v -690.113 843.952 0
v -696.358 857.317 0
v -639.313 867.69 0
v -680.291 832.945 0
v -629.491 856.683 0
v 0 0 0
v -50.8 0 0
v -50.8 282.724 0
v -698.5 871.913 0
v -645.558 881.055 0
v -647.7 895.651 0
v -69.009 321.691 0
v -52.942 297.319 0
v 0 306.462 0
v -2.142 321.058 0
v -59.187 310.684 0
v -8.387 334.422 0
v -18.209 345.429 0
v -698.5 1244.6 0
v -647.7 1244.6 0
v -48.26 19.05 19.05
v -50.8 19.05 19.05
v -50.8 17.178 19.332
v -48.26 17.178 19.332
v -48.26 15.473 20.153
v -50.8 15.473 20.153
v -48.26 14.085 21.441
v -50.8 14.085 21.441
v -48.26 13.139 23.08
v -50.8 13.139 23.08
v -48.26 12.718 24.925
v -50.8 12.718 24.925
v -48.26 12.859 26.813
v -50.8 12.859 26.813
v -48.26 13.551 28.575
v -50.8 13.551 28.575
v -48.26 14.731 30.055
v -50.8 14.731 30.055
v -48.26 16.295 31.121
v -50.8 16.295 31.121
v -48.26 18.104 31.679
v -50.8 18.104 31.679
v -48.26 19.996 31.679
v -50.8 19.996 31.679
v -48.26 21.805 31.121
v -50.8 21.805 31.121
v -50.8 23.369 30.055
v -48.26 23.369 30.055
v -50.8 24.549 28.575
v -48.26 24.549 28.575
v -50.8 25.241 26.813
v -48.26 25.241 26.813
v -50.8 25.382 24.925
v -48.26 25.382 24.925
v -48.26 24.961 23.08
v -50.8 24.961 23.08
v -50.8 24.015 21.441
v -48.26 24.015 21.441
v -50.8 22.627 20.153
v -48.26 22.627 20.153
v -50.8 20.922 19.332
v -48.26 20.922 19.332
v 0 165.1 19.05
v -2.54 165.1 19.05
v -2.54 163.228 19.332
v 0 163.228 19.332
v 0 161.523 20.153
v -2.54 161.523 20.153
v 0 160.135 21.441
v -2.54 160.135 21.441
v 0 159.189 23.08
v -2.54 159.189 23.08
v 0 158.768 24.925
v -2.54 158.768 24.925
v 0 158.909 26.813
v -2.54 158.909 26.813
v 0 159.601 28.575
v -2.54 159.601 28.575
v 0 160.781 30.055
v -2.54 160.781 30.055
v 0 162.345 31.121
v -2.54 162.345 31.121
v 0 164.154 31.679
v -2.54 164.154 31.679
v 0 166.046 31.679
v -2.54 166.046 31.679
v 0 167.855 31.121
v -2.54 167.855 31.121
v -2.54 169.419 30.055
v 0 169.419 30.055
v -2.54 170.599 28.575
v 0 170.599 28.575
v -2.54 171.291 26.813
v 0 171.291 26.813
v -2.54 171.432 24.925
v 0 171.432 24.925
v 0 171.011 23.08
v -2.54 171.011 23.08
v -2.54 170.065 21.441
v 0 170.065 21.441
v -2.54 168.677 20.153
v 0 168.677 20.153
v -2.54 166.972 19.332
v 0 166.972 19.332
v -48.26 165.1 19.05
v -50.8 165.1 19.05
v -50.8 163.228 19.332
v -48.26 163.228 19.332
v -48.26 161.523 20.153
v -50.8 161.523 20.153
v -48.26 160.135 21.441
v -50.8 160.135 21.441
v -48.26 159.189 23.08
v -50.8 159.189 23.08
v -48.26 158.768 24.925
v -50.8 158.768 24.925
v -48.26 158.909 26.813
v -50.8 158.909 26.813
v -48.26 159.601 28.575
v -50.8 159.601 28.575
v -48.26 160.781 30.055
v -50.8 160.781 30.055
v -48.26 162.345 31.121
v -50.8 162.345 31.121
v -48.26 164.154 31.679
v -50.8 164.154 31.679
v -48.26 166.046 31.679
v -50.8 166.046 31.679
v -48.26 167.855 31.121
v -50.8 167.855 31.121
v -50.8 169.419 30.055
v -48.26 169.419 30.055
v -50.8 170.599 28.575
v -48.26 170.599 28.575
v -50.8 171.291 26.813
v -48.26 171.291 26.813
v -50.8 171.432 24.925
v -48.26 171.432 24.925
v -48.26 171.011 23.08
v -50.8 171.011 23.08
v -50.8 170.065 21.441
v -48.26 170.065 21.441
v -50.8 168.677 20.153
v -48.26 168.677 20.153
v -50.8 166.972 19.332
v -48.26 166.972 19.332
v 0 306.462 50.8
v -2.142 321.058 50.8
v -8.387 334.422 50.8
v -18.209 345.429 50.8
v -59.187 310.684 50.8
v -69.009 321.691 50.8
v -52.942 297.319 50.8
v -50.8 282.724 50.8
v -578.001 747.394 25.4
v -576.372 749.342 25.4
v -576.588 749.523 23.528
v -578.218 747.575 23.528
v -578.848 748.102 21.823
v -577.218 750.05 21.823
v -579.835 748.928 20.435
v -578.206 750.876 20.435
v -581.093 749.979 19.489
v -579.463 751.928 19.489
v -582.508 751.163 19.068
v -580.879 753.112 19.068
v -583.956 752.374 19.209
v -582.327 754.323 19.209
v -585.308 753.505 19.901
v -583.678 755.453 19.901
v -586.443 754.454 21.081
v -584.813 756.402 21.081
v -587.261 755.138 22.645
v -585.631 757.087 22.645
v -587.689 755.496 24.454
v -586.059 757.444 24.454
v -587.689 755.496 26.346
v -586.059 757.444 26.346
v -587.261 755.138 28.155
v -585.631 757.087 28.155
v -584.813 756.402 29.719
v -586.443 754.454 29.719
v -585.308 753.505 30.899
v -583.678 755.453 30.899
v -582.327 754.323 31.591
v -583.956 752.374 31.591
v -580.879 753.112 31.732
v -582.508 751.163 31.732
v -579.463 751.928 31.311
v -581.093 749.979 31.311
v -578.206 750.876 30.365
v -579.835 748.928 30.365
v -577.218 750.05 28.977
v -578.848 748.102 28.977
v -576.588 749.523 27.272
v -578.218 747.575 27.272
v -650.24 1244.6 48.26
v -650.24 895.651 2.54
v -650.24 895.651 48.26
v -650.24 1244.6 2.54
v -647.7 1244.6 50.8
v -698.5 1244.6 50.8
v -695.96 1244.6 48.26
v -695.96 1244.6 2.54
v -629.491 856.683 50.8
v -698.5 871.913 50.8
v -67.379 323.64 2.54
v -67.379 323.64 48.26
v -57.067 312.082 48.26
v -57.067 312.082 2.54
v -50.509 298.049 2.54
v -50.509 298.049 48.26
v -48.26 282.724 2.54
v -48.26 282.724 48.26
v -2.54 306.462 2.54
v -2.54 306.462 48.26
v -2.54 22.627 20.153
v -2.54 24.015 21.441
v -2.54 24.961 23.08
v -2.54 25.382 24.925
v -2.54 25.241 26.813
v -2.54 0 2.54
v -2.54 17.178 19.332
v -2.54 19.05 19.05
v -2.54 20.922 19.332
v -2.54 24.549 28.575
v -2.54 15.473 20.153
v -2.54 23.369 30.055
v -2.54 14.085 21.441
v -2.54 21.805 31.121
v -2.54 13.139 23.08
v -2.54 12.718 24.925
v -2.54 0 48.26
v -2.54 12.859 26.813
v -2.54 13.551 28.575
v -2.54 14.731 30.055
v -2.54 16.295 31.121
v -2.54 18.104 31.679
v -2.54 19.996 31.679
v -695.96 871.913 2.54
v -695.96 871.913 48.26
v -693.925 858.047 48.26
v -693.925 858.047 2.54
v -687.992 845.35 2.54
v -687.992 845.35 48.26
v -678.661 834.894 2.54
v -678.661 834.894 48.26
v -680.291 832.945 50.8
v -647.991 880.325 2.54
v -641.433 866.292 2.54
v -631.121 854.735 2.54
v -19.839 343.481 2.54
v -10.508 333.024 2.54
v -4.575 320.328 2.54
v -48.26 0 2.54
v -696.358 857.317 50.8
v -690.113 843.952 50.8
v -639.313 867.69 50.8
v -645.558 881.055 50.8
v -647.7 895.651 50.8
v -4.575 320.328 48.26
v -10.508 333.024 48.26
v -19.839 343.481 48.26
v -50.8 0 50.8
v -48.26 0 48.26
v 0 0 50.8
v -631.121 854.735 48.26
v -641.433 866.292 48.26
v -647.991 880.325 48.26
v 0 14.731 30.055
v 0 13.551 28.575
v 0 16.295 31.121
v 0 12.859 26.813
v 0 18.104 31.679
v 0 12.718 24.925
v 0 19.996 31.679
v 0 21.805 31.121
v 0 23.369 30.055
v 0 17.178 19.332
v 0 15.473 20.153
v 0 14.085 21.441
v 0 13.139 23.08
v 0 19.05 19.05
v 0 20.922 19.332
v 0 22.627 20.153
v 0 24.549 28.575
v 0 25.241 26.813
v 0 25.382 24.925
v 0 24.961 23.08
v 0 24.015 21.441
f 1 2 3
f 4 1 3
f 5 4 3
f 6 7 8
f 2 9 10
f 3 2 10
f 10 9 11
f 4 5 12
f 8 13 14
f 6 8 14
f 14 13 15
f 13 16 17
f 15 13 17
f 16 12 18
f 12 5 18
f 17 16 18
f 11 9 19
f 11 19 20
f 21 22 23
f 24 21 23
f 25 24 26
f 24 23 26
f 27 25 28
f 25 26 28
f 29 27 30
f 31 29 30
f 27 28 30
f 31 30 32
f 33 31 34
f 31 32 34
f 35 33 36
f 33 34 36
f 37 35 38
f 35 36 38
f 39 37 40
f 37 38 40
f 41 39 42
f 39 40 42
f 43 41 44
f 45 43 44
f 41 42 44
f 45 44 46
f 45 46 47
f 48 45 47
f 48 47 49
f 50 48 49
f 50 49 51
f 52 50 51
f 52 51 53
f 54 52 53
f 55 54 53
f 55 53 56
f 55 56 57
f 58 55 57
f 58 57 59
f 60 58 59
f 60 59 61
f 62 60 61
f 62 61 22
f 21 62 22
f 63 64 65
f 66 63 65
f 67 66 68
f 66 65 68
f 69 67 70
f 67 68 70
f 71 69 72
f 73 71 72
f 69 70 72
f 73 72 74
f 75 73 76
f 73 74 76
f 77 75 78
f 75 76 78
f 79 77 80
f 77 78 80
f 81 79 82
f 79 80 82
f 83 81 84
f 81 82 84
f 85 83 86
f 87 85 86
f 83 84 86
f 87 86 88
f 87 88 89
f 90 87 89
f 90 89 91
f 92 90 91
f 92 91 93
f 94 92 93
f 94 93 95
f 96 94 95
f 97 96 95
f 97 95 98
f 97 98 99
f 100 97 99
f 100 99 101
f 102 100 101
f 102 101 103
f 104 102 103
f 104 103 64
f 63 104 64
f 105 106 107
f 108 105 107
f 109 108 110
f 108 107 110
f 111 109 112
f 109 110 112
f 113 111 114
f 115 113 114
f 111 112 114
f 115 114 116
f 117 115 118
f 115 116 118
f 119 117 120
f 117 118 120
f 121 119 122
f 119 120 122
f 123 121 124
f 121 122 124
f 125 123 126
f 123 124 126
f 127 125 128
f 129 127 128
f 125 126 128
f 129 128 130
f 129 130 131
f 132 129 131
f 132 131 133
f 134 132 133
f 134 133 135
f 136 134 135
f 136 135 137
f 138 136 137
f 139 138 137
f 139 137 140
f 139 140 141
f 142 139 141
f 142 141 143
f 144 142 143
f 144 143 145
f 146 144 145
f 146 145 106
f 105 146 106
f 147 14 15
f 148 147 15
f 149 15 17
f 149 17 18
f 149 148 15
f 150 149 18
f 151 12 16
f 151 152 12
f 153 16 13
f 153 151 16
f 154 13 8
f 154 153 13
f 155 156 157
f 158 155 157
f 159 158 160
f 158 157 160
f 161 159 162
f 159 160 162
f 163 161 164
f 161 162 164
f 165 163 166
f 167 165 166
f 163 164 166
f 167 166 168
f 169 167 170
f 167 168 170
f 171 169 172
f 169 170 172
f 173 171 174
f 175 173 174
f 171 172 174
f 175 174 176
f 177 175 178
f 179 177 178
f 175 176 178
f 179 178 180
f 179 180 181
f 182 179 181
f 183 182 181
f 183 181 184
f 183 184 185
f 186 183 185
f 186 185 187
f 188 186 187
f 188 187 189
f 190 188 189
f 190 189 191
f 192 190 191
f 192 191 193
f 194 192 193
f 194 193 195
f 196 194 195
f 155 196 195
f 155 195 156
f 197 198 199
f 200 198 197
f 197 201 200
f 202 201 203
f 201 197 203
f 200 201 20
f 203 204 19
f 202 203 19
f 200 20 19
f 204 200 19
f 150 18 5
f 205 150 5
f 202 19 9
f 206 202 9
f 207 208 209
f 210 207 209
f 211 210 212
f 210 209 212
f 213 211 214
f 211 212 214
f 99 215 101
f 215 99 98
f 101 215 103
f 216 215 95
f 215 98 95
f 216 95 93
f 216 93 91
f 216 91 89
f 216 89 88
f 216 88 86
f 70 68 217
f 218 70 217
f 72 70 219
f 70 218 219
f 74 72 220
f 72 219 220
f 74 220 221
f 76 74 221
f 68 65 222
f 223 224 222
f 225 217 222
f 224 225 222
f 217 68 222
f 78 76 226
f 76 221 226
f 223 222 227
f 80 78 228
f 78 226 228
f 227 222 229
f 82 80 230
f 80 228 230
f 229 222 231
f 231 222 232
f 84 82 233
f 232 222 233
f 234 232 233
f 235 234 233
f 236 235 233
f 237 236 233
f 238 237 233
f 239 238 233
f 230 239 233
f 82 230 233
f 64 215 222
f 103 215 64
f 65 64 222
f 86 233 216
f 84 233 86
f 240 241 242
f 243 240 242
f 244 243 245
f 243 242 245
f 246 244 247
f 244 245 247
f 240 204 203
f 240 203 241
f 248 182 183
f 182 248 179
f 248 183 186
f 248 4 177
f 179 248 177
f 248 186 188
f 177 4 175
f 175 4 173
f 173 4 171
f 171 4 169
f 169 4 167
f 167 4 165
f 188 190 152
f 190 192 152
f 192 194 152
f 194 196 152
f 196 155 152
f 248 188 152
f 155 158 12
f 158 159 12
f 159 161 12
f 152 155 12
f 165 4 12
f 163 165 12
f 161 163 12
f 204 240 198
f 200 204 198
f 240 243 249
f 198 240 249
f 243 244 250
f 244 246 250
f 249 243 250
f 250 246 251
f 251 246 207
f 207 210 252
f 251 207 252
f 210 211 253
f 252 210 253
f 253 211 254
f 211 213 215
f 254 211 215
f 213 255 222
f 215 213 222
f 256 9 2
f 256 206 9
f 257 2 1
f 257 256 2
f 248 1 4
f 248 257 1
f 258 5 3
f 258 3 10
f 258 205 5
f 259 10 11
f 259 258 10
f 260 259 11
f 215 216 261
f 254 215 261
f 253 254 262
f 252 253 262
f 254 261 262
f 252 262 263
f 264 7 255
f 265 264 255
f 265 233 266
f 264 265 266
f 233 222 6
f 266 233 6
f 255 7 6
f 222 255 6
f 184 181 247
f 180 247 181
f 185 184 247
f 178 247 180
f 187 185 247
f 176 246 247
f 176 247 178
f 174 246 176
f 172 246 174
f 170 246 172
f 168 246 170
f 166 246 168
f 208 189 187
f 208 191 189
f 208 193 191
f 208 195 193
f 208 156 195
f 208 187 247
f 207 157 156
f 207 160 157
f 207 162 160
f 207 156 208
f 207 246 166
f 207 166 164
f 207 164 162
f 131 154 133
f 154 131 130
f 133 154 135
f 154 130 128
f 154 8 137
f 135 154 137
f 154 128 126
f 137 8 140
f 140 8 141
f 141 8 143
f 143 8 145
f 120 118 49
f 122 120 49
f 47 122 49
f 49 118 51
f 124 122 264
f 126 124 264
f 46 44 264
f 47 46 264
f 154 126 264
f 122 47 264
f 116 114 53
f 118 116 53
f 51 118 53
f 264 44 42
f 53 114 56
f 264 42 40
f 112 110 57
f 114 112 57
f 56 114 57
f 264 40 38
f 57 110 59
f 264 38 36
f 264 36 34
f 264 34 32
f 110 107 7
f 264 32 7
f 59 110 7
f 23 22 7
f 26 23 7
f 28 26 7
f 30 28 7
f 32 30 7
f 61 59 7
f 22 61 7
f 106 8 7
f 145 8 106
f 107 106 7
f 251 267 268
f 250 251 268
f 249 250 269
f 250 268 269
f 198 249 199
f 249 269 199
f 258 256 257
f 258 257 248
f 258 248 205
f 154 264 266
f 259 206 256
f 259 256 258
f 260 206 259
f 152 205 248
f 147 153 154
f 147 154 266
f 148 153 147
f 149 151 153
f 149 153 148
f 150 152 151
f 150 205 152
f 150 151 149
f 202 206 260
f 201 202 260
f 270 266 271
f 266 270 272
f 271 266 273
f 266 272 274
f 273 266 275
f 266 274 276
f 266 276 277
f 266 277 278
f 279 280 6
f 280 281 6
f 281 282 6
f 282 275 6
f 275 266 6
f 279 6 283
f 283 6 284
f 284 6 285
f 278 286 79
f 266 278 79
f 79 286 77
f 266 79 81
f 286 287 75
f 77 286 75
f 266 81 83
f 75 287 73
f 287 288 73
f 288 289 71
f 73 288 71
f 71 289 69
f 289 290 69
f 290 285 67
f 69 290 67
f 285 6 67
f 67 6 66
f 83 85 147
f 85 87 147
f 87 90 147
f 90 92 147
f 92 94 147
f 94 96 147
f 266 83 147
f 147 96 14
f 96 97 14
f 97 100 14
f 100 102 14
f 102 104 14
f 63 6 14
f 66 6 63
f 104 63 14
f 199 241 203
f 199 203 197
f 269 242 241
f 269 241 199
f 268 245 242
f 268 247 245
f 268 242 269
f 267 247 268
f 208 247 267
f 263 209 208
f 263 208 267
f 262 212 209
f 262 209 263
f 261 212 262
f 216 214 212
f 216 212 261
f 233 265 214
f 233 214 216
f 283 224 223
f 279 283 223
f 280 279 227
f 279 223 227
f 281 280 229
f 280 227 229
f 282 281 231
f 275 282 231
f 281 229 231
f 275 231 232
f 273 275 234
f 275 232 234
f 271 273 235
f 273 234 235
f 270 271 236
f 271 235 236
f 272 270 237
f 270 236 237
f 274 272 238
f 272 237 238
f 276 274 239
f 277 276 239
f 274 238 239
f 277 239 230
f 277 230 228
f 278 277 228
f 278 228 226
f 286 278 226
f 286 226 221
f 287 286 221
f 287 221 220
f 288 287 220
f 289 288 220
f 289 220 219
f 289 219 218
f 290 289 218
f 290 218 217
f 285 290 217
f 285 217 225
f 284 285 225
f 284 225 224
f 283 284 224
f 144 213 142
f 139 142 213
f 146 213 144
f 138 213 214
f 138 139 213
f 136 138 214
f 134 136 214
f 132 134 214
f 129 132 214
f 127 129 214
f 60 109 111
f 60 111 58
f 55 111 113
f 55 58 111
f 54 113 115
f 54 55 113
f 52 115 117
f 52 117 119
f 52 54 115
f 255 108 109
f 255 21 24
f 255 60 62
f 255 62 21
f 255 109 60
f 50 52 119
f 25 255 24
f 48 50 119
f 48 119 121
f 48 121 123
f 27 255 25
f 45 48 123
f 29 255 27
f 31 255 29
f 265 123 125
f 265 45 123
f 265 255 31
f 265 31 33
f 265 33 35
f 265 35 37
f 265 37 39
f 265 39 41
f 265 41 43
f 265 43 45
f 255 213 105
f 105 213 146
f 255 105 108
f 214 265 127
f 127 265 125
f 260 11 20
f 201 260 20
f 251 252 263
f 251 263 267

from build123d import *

# Parameters (mm, degrees)
BOSS_EXTRUDE1_DEPTH           = 50.8
FILLET1_R                     = 50.8
SHELL1_T                      = -2.54
SKETCH2_W                     = 45.72
SKETCH2_H                     = 45.72
CUT_EXTRUDE1_DEPTH            = 50.8
F_97_0_5_DIAMETER_HOLE1_D     = 12.7
F_97_0_5_DIAMETER_HOLE2_D     = 12.7
F_97_0_5_DIAMETER_HOLE2_DEPTH = 12.7
F_97_0_5_DIAMETER_HOLE2_TIP   = 3.815464931


with BuildPart() as part:
    # Sketch1 → Boss-Extrude1 (new body)
    with BuildSketch(Plane.XY):
        Polygon((0, 0), (0, 330.2), (-647.7, 871.912727273), (-647.7, 1244.6), (-698.5, 1244.6), (-698.5, 848.174564223), (-50.8, 306.461836951), (-50.8, 0), align=None)
    extrude(amount=BOSS_EXTRUDE1_DEPTH)

    # Fillet1
    fillet1_edges = [part.edges().sort_by_distance(p)[0] for p in [
        (-50.8, 306.461836951, 25.4),
        (-698.5, 848.174564223, 25.4),
        (-647.7, 871.912727273, 25.4),
        (0, 330.2, 25.4),
    ]]
    fillet(fillet1_edges, radius=FILLET1_R)

    # Shell1
    shell1_openings = [part.faces().sort_by_distance(p)[0] for p in [
        (-673.1, 1244.6, 25.4),
    ]]
    offset(amount=SHELL1_T, openings=shell1_openings, kind=Kind.INTERSECTION)

    # Sketch2 → Cut-Extrude1 (cut)
    with BuildSketch(Plane.XZ):
        with Locations((-25.4, 25.4)):
            Rectangle(SKETCH2_W, SKETCH2_H)
    extrude(amount=-CUT_EXTRUDE1_DEPTH, mode=Mode.SUBTRACT)

    # #97 (0.5) Diameter Hole1 (through all)
    with Locations(Plane(origin=(0, 19.05, 25.4), x_dir=(0, 0, 1), z_dir=(1, 0, 0))):
        with Locations((0, 0), (0, -146.05)):
            Hole(F_97_0_5_DIAMETER_HOLE1_D / 2)

    # #97 (0.5) Diameter Hole2
    with Locations(Plane(origin=(-582.872241676, 751.467711807, 25.4), x_dir=(-0.767076870152, 0.641555200491, 0), z_dir=(-0.641555200491, -0.767076870152, 0))):
        with Locations((-1e-09, 0)):
            Hole(F_97_0_5_DIAMETER_HOLE2_D / 2, depth=F_97_0_5_DIAMETER_HOLE2_DEPTH)
            with Locations((0, 0, -(F_97_0_5_DIAMETER_HOLE2_DEPTH + F_97_0_5_DIAMETER_HOLE2_TIP / 2))):  # 118° drill point
                Cone(0, F_97_0_5_DIAMETER_HOLE2_D / 2, F_97_0_5_DIAMETER_HOLE2_TIP, mode=Mode.SUBTRACT)


solid = part.part
